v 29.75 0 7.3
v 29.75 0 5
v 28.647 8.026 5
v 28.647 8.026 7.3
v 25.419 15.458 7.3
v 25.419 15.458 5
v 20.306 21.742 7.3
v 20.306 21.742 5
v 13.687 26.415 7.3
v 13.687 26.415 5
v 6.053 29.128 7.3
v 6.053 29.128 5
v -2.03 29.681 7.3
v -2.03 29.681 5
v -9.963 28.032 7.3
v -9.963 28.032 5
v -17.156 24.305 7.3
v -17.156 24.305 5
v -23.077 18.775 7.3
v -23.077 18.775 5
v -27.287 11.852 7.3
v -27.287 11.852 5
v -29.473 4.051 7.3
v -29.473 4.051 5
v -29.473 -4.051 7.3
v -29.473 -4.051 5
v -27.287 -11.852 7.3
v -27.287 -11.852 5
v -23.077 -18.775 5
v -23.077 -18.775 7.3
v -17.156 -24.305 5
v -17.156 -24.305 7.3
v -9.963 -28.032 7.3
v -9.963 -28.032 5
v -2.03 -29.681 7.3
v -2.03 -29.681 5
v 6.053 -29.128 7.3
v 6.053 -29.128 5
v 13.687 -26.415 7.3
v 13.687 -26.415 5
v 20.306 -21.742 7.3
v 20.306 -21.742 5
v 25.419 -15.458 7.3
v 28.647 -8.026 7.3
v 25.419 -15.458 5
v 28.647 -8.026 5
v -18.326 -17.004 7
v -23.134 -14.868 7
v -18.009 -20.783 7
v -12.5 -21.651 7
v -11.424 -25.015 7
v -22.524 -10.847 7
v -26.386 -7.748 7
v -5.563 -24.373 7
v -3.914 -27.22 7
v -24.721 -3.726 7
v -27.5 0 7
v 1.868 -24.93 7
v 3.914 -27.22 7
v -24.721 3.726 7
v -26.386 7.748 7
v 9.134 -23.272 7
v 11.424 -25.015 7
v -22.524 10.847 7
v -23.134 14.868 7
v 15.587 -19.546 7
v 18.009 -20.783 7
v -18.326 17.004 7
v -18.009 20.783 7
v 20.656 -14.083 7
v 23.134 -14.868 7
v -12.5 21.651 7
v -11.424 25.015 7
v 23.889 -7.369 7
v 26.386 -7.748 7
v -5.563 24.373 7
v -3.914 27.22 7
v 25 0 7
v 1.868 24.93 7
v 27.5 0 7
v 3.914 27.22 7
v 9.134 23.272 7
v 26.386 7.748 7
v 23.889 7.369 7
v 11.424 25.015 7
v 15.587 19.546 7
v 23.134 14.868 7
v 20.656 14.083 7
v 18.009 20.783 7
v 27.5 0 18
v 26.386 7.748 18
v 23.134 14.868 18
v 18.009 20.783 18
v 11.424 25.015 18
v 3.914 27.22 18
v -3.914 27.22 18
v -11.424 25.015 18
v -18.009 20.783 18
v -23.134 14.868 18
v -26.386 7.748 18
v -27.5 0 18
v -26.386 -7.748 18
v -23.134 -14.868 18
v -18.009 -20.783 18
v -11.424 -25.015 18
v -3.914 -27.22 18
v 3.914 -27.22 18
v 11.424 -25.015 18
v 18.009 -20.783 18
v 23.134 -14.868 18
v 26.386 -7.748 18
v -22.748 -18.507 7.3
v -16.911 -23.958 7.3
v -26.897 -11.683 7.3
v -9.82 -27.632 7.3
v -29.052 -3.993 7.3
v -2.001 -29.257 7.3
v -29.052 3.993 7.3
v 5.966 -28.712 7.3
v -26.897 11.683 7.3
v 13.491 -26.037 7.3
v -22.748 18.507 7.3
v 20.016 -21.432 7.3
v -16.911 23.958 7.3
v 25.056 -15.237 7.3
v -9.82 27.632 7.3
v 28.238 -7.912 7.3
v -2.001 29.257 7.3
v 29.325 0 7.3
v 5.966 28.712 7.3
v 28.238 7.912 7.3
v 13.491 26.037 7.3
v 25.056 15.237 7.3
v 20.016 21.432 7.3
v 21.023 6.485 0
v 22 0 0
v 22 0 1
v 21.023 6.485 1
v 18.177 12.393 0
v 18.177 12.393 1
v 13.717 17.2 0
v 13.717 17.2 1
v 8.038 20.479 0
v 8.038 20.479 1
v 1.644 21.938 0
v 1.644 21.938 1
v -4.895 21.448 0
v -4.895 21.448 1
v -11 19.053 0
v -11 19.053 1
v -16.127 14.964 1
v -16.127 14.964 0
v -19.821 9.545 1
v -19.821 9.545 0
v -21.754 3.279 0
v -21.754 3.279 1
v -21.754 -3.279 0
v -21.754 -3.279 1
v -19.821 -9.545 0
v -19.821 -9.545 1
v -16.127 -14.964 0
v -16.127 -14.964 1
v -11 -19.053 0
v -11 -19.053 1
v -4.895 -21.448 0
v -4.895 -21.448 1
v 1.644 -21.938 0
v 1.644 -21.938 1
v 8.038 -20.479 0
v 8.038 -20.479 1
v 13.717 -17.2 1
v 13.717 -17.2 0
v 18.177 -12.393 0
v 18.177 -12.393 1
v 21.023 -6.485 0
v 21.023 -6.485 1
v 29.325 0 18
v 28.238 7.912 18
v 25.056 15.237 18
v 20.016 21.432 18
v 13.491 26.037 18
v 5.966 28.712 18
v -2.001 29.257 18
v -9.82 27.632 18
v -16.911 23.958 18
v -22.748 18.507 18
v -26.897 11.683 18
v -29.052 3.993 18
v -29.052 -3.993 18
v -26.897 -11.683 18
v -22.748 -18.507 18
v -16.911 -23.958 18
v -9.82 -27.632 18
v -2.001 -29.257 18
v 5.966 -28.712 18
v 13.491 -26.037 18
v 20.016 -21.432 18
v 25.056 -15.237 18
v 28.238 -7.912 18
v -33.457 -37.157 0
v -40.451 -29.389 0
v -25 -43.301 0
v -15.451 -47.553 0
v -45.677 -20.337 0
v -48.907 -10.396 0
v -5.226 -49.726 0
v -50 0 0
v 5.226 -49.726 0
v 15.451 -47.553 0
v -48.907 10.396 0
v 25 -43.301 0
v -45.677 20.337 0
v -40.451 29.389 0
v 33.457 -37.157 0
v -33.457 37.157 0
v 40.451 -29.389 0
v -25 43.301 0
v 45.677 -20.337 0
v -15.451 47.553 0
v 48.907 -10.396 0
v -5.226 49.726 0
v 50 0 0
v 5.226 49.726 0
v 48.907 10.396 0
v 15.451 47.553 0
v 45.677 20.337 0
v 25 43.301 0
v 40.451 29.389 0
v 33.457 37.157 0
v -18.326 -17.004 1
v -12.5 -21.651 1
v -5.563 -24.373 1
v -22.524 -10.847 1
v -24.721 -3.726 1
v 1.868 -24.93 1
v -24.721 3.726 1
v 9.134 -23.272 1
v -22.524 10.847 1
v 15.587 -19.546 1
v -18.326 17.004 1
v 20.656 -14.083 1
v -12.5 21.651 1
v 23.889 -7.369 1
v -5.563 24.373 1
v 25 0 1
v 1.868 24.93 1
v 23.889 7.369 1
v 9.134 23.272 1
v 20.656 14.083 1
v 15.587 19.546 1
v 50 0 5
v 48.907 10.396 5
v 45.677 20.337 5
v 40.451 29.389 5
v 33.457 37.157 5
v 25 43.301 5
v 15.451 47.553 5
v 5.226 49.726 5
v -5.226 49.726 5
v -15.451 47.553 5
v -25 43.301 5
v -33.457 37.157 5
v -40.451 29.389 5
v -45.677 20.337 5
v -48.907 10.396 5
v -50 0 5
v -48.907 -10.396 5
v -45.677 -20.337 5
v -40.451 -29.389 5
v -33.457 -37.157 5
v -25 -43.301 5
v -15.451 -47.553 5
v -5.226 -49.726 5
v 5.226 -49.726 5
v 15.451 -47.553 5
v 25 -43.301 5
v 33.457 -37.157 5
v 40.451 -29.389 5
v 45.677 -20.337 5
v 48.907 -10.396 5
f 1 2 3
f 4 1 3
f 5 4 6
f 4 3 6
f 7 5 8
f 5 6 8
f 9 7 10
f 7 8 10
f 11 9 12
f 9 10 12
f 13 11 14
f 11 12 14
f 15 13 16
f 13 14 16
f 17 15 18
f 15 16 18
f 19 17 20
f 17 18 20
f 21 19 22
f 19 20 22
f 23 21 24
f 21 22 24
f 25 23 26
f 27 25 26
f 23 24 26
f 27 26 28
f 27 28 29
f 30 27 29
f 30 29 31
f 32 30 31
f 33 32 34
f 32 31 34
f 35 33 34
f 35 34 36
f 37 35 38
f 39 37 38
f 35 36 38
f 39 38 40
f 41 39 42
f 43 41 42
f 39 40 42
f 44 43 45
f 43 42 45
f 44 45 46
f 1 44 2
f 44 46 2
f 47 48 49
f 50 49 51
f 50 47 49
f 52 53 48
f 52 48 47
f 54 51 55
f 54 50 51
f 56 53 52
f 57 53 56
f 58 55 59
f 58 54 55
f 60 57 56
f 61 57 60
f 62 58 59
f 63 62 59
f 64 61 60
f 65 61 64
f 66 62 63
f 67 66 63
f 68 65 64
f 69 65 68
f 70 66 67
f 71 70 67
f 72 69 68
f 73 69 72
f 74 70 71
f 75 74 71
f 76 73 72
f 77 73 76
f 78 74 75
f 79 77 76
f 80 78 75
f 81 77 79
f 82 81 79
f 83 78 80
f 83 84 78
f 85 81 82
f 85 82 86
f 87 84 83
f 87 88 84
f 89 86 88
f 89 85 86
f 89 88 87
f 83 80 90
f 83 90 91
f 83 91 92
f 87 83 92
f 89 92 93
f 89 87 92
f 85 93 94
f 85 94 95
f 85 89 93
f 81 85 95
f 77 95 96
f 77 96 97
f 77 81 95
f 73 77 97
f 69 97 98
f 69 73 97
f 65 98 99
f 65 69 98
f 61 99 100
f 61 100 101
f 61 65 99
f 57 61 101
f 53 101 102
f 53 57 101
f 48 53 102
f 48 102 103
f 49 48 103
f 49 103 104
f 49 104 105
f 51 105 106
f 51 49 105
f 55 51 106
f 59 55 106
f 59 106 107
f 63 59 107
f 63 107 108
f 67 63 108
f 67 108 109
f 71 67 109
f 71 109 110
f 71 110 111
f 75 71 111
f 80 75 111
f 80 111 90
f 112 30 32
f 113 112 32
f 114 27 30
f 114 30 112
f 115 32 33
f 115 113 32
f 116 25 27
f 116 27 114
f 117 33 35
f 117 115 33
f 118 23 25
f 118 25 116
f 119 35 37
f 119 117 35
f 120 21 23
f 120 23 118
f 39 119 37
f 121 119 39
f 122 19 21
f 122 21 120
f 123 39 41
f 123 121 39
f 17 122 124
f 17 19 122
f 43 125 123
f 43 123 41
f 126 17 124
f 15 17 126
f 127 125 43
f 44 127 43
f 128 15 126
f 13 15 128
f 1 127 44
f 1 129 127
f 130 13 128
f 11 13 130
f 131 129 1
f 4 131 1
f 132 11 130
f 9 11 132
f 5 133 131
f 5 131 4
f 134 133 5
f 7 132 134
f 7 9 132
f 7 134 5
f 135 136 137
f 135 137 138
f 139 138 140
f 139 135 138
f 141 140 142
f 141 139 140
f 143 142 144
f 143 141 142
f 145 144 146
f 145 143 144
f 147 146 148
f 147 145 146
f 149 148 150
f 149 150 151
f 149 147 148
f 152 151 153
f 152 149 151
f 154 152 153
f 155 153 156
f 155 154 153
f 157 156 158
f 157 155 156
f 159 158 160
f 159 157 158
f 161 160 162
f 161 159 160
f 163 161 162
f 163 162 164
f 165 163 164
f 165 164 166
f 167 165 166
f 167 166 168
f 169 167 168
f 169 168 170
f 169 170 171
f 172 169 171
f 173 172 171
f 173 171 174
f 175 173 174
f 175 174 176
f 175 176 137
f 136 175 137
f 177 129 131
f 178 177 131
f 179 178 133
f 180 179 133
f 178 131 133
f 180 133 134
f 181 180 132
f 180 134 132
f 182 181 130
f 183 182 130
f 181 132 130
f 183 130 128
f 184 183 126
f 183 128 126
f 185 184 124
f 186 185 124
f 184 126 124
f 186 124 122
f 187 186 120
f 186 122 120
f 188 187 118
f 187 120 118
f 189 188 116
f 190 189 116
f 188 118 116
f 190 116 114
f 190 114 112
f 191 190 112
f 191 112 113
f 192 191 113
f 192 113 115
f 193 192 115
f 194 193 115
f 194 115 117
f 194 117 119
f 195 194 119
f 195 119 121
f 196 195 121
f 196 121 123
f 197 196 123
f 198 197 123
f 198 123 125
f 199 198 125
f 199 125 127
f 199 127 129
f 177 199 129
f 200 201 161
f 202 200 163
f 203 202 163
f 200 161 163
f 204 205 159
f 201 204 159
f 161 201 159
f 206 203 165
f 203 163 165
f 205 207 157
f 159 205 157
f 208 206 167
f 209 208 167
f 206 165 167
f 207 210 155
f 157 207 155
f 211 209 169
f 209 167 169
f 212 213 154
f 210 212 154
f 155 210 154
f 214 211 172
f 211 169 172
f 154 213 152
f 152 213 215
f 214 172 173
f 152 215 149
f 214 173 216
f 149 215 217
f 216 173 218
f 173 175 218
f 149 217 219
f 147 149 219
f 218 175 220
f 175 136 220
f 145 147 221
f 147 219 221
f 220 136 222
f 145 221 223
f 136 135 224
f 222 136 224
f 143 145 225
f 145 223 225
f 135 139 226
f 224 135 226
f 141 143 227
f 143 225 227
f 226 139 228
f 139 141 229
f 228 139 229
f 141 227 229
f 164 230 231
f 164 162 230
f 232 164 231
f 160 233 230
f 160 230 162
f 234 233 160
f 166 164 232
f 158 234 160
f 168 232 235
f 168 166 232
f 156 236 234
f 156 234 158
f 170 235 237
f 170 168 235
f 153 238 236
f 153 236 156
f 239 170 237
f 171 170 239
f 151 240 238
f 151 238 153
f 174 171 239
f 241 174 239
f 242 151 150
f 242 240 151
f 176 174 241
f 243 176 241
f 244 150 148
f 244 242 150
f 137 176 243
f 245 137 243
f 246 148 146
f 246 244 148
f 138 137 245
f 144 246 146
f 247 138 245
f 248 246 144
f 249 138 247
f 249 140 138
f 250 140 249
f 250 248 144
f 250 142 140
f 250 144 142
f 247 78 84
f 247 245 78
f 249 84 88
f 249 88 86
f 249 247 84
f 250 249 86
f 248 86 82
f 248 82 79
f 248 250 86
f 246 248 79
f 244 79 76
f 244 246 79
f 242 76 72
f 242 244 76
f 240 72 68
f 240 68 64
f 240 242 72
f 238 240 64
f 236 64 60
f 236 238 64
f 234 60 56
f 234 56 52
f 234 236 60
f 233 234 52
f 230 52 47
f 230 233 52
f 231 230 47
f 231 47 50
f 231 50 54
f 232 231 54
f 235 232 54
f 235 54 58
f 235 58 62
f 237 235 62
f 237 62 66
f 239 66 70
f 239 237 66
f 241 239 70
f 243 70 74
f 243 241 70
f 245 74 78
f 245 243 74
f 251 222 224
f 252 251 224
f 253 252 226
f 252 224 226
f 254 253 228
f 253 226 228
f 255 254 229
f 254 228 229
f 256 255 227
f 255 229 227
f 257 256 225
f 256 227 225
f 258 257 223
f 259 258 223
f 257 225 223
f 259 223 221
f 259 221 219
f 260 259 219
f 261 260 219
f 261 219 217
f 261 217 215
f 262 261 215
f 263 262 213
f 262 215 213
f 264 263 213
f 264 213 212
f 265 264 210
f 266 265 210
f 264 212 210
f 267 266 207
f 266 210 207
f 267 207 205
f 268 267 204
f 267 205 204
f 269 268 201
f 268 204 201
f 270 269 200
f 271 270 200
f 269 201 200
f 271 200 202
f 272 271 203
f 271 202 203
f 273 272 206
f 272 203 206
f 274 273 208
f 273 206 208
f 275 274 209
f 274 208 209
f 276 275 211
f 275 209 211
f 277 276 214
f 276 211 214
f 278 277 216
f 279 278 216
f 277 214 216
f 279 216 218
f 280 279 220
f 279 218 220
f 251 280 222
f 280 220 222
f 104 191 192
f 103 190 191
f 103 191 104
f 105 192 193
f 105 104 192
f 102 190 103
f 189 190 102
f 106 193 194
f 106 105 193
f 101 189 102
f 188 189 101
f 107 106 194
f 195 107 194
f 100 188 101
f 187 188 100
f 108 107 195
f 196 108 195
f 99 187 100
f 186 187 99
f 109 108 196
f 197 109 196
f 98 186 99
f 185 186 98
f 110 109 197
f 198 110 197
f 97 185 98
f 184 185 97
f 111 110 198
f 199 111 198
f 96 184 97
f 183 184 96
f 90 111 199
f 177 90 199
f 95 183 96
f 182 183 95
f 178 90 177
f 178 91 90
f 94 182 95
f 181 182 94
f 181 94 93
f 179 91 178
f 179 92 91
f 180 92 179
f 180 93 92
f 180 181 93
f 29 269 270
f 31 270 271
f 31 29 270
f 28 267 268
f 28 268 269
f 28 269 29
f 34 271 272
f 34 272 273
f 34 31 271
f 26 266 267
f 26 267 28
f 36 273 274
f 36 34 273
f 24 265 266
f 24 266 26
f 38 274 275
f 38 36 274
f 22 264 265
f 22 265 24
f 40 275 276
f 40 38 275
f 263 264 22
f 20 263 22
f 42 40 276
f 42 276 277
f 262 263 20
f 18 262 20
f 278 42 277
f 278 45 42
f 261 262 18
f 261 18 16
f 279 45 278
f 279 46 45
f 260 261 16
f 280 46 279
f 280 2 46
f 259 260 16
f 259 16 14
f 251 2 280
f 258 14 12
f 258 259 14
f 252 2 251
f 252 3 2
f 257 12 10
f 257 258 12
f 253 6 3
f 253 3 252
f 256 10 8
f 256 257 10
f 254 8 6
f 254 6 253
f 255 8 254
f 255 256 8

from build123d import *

# Parameters (mm, degrees)
SKETCH1_R           = 50
SKETCH1_R_2         = 22
BOSS_EXTRUDE1_DEPTH = 5
SKETCH1_3_R         = 29.325
SKETCH1_3_R_2       = 27.5
BOSS_EXTRUDE2_DEPTH = 18
SKETCH2_R           = 29.75
SKETCH2_R_2         = 29.325
BOSS_EXTRUDE3_DEPTH = 2.3
SKETCH3_R           = 27.5
SKETCH3_R_2         = 25
BOSS_EXTRUDE4_DEPTH = 2
CUT_EXTRUDE1_START  = -4
SKETCH4_R           = 25
SKETCH4_R_2         = 22
CUT_EXTRUDE1_DEPTH  = 4


with BuildPart() as part:
    # Sketch1 → Boss-Extrude1 (new body)
    with BuildSketch(Plane.XY):
        Circle(SKETCH1_R)
        Circle(SKETCH1_R_2, mode=Mode.SUBTRACT)
    extrude(amount=BOSS_EXTRUDE1_DEPTH)

    # Sketch1<3> → Boss-Extrude2 (add)
    with BuildSketch(Plane.XY):
        Circle(SKETCH1_3_R)
        Circle(SKETCH1_3_R_2, mode=Mode.SUBTRACT)
    extrude(amount=BOSS_EXTRUDE2_DEPTH)

    # Sketch2 → Boss-Extrude3 (add)
    with BuildSketch(Plane.XY.offset(5)):
        Circle(SKETCH2_R)
        Circle(SKETCH2_R_2, mode=Mode.SUBTRACT)
    extrude(amount=BOSS_EXTRUDE3_DEPTH)

    # Sketch3 → Boss-Extrude4 (add)
    with BuildSketch(Plane.XY.offset(5)):
        Circle(SKETCH3_R)
        Circle(SKETCH3_R_2, mode=Mode.SUBTRACT)
    extrude(amount=BOSS_EXTRUDE4_DEPTH)

    # Sketch4 → Cut-Extrude1 (cut)
    with BuildSketch(Plane.XY.offset(5).offset(CUT_EXTRUDE1_START)):
        Circle(SKETCH4_R)
        Circle(SKETCH4_R_2, mode=Mode.SUBTRACT)
    extrude(amount=CUT_EXTRUDE1_DEPTH, mode=Mode.SUBTRACT)


solid = part.part
